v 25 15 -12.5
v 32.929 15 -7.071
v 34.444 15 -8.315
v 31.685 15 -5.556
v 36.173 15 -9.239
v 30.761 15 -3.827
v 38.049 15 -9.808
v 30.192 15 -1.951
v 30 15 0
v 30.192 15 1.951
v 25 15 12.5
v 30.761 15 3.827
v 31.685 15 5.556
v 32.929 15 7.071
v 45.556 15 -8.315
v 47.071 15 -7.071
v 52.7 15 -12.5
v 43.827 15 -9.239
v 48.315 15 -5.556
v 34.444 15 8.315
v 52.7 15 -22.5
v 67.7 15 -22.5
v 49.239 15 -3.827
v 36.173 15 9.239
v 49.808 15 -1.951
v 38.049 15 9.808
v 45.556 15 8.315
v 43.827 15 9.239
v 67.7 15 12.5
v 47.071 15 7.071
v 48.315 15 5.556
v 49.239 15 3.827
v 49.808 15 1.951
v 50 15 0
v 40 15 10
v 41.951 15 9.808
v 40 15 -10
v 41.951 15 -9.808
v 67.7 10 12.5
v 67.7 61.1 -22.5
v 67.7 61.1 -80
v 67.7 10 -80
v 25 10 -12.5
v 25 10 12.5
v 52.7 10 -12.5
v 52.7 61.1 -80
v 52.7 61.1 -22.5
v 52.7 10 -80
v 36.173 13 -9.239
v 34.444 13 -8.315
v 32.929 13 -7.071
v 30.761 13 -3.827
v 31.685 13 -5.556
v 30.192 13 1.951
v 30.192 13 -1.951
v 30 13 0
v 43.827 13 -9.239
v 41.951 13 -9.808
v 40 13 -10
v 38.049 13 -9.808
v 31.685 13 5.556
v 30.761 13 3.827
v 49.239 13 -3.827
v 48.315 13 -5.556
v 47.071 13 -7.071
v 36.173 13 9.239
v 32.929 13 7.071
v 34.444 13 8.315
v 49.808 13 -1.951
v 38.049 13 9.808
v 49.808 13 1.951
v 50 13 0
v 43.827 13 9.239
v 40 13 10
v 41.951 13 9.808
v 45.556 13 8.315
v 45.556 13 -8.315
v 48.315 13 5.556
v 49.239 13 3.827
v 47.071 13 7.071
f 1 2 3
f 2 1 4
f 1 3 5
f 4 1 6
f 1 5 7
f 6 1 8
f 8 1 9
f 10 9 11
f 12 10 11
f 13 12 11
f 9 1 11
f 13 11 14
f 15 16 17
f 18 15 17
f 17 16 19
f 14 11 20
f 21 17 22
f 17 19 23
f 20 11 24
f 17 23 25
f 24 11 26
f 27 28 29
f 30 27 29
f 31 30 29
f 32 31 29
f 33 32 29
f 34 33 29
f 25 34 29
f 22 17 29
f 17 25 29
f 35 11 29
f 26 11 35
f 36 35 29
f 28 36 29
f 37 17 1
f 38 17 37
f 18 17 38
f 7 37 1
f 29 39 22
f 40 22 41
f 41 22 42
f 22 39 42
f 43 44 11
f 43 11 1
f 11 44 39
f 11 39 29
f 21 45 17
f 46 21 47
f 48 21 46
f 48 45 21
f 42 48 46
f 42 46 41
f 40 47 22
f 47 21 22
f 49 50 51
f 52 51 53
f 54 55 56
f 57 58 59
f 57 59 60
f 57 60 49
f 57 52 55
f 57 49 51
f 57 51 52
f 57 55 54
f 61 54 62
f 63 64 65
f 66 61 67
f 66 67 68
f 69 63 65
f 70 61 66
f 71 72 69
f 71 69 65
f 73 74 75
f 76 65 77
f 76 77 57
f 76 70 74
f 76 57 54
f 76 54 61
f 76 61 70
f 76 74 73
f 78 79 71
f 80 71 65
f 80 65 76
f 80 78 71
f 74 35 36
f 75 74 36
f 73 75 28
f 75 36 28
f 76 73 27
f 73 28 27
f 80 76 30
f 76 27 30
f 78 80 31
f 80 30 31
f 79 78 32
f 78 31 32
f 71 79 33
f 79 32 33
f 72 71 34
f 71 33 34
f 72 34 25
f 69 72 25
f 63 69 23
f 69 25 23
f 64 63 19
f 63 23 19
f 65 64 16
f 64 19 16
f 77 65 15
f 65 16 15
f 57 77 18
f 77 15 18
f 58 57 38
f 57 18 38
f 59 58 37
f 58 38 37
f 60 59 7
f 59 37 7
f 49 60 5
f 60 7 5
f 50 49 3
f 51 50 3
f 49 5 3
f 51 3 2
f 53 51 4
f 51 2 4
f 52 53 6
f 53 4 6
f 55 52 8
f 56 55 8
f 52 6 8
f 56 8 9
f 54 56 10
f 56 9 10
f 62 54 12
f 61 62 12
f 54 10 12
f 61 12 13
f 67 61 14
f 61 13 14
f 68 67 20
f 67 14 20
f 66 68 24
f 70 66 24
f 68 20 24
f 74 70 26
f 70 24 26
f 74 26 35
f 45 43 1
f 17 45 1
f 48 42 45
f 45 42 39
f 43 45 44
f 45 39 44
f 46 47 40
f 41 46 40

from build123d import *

# Parameters (mm, degrees)
SKETCH1_W           = 100
SKETCH1_H           = 40
BOSS_EXTRUDE1_DEPTH = 15
MOVE_FACE4_BY       = 5
SKETCH5_R           = 10
CUT_EXTRUDE2_DEPTH  = 2
MOVE_FACE5_BY       = 7.5
MOVE_FACE5_2_BY     = 7.5
MOVE_FACE7_BY       = 75
MOVE_FACE8_BY       = 5
MOVE_FACE9_BY       = 12.7
SKETCH6_W           = 15
SKETCH6_H           = 10
BOSS_EXTRUDE2_DEPTH = 100
MOVE_FACE10_BY      = 22.5
SKETCH7_W           = 15
SKETCH7_H           = 77.5
BOSS_EXTRUDE3_DEPTH = 47.8
MOVE_FACE11_BY      = 5
MOVE_FACE12_BY      = 6.7
MOVE_FACE13_BY      = 4.1
MOVE_FACE16_BY      = 0.9
MOVE_FACE17_BY      = 10
MOVE_FACE18_BY      = 10


with BuildPart() as part:
    # Sketch1 → Boss-Extrude1 (new body)
    with BuildSketch(Plane(origin=(0, 0, 0), x_dir=(1, 0, 0), z_dir=(0, 1, 0))):
        Rectangle(SKETCH1_W, SKETCH1_H)
    extrude(amount=BOSS_EXTRUDE1_DEPTH)

    # Move Face4: a face moved outward by 5.0
    extrude(part.faces().sort_by_distance((50, 7.5, 0))[0], amount=MOVE_FACE4_BY, dir=(1, 0, 0))

    # Sketch5 → Cut-Extrude2 (cut)
    with BuildSketch(Plane(origin=(0, 15, 0), x_dir=(1, 0, 0), z_dir=(0, 1, 0))):
        with Locations(Location((40, 0, 0), (0, 0, 270))):
            Circle(SKETCH5_R)
    extrude(amount=-CUT_EXTRUDE2_DEPTH, mode=Mode.SUBTRACT)

    # Move Face5: a face moved inward by 7.5
    extrude(part.faces().sort_by_distance((2.5, 7.5, -20))[0], amount=MOVE_FACE5_BY, dir=(0, 0, 1), mode=Mode.SUBTRACT)

    # Move Face5 2: a face moved inward by 7.5
    extrude(part.faces().sort_by_distance((2.5, 7.5, 20))[0], amount=MOVE_FACE5_2_BY, dir=(0, 0, -1), mode=Mode.SUBTRACT)

    # Move Face7: a face moved inward by 75.0
    extrude(part.faces().sort_by_distance((-50, 7.5, 0))[0], amount=MOVE_FACE7_BY, dir=(1, 0, 0), mode=Mode.SUBTRACT)

    # Move Face8: a face moved inward by 5.0
    extrude(part.faces().sort_by_distance((40, 0, 0))[0], amount=MOVE_FACE8_BY, dir=(0, 1, 0), mode=Mode.SUBTRACT)

    # Move Face9: a face moved outward by 12.7
    extrude(part.faces().sort_by_distance((55, 10, 0))[0], amount=MOVE_FACE9_BY, dir=(1, 0, 0))

    # Sketch6 → Boss-Extrude2 (add)
    with BuildSketch(Plane(origin=(0, 0, -12.5), x_dir=(-1, 0, 0), z_dir=(0, 0, -1))):
        with Locations((-60.2, 10)):
            Rectangle(SKETCH6_W, SKETCH6_H)
    extrude(amount=BOSS_EXTRUDE2_DEPTH)

    # Move Face10: a face moved inward by 22.5
    extrude(part.faces().sort_by_distance((60.2, 10, -112.5))[0], amount=MOVE_FACE10_BY, dir=(0, 0, 1), mode=Mode.SUBTRACT)

    # Sketch7 → Boss-Extrude3 (add)
    with BuildSketch(Plane(origin=(0, 15, 0), x_dir=(1, 0, 0), z_dir=(0, 1, 0))):
        with Locations((60.2, 51.25)):
            Rectangle(SKETCH7_W, SKETCH7_H)
    extrude(amount=BOSS_EXTRUDE3_DEPTH)

    # Move Face11: a face moved inward by 5.0
    extrude(part.faces().sort_by_distance((53.570011211, 5, -26.716647982))[0], amount=MOVE_FACE11_BY, dir=(0, 1, 0), mode=Mode.SUBTRACT)

    # Move Face12: a face moved inward by 6.7
    extrude(part.faces().sort_by_distance((60.2, 62.8, -51.25))[0], amount=MOVE_FACE12_BY, dir=(0, -1, 0), mode=Mode.SUBTRACT)

    # Move Face13: a face moved outward by 4.1
    extrude(part.faces().sort_by_distance((60.2, 56.1, -51.25))[0], amount=MOVE_FACE13_BY, dir=(0, 1, 0))

    # Move Face16: a face moved outward by 0.9
    extrude(part.faces().sort_by_distance((60.2, 60.2, -51.25))[0], amount=MOVE_FACE16_BY, dir=(0, 1, 0))

    # Move Face17: a face moved inward by 10.0
    extrude(part.faces().sort_by_distance((60.2, 38.05, -12.5))[0], amount=MOVE_FACE17_BY, dir=(0, 0, -1), mode=Mode.SUBTRACT)

    # Move Face18: a face moved inward by 10.0
    extrude(part.faces().sort_by_distance((60.2, 35.55, -90))[0], amount=MOVE_FACE18_BY, dir=(0, 0, 1), mode=Mode.SUBTRACT)


solid = part.part
